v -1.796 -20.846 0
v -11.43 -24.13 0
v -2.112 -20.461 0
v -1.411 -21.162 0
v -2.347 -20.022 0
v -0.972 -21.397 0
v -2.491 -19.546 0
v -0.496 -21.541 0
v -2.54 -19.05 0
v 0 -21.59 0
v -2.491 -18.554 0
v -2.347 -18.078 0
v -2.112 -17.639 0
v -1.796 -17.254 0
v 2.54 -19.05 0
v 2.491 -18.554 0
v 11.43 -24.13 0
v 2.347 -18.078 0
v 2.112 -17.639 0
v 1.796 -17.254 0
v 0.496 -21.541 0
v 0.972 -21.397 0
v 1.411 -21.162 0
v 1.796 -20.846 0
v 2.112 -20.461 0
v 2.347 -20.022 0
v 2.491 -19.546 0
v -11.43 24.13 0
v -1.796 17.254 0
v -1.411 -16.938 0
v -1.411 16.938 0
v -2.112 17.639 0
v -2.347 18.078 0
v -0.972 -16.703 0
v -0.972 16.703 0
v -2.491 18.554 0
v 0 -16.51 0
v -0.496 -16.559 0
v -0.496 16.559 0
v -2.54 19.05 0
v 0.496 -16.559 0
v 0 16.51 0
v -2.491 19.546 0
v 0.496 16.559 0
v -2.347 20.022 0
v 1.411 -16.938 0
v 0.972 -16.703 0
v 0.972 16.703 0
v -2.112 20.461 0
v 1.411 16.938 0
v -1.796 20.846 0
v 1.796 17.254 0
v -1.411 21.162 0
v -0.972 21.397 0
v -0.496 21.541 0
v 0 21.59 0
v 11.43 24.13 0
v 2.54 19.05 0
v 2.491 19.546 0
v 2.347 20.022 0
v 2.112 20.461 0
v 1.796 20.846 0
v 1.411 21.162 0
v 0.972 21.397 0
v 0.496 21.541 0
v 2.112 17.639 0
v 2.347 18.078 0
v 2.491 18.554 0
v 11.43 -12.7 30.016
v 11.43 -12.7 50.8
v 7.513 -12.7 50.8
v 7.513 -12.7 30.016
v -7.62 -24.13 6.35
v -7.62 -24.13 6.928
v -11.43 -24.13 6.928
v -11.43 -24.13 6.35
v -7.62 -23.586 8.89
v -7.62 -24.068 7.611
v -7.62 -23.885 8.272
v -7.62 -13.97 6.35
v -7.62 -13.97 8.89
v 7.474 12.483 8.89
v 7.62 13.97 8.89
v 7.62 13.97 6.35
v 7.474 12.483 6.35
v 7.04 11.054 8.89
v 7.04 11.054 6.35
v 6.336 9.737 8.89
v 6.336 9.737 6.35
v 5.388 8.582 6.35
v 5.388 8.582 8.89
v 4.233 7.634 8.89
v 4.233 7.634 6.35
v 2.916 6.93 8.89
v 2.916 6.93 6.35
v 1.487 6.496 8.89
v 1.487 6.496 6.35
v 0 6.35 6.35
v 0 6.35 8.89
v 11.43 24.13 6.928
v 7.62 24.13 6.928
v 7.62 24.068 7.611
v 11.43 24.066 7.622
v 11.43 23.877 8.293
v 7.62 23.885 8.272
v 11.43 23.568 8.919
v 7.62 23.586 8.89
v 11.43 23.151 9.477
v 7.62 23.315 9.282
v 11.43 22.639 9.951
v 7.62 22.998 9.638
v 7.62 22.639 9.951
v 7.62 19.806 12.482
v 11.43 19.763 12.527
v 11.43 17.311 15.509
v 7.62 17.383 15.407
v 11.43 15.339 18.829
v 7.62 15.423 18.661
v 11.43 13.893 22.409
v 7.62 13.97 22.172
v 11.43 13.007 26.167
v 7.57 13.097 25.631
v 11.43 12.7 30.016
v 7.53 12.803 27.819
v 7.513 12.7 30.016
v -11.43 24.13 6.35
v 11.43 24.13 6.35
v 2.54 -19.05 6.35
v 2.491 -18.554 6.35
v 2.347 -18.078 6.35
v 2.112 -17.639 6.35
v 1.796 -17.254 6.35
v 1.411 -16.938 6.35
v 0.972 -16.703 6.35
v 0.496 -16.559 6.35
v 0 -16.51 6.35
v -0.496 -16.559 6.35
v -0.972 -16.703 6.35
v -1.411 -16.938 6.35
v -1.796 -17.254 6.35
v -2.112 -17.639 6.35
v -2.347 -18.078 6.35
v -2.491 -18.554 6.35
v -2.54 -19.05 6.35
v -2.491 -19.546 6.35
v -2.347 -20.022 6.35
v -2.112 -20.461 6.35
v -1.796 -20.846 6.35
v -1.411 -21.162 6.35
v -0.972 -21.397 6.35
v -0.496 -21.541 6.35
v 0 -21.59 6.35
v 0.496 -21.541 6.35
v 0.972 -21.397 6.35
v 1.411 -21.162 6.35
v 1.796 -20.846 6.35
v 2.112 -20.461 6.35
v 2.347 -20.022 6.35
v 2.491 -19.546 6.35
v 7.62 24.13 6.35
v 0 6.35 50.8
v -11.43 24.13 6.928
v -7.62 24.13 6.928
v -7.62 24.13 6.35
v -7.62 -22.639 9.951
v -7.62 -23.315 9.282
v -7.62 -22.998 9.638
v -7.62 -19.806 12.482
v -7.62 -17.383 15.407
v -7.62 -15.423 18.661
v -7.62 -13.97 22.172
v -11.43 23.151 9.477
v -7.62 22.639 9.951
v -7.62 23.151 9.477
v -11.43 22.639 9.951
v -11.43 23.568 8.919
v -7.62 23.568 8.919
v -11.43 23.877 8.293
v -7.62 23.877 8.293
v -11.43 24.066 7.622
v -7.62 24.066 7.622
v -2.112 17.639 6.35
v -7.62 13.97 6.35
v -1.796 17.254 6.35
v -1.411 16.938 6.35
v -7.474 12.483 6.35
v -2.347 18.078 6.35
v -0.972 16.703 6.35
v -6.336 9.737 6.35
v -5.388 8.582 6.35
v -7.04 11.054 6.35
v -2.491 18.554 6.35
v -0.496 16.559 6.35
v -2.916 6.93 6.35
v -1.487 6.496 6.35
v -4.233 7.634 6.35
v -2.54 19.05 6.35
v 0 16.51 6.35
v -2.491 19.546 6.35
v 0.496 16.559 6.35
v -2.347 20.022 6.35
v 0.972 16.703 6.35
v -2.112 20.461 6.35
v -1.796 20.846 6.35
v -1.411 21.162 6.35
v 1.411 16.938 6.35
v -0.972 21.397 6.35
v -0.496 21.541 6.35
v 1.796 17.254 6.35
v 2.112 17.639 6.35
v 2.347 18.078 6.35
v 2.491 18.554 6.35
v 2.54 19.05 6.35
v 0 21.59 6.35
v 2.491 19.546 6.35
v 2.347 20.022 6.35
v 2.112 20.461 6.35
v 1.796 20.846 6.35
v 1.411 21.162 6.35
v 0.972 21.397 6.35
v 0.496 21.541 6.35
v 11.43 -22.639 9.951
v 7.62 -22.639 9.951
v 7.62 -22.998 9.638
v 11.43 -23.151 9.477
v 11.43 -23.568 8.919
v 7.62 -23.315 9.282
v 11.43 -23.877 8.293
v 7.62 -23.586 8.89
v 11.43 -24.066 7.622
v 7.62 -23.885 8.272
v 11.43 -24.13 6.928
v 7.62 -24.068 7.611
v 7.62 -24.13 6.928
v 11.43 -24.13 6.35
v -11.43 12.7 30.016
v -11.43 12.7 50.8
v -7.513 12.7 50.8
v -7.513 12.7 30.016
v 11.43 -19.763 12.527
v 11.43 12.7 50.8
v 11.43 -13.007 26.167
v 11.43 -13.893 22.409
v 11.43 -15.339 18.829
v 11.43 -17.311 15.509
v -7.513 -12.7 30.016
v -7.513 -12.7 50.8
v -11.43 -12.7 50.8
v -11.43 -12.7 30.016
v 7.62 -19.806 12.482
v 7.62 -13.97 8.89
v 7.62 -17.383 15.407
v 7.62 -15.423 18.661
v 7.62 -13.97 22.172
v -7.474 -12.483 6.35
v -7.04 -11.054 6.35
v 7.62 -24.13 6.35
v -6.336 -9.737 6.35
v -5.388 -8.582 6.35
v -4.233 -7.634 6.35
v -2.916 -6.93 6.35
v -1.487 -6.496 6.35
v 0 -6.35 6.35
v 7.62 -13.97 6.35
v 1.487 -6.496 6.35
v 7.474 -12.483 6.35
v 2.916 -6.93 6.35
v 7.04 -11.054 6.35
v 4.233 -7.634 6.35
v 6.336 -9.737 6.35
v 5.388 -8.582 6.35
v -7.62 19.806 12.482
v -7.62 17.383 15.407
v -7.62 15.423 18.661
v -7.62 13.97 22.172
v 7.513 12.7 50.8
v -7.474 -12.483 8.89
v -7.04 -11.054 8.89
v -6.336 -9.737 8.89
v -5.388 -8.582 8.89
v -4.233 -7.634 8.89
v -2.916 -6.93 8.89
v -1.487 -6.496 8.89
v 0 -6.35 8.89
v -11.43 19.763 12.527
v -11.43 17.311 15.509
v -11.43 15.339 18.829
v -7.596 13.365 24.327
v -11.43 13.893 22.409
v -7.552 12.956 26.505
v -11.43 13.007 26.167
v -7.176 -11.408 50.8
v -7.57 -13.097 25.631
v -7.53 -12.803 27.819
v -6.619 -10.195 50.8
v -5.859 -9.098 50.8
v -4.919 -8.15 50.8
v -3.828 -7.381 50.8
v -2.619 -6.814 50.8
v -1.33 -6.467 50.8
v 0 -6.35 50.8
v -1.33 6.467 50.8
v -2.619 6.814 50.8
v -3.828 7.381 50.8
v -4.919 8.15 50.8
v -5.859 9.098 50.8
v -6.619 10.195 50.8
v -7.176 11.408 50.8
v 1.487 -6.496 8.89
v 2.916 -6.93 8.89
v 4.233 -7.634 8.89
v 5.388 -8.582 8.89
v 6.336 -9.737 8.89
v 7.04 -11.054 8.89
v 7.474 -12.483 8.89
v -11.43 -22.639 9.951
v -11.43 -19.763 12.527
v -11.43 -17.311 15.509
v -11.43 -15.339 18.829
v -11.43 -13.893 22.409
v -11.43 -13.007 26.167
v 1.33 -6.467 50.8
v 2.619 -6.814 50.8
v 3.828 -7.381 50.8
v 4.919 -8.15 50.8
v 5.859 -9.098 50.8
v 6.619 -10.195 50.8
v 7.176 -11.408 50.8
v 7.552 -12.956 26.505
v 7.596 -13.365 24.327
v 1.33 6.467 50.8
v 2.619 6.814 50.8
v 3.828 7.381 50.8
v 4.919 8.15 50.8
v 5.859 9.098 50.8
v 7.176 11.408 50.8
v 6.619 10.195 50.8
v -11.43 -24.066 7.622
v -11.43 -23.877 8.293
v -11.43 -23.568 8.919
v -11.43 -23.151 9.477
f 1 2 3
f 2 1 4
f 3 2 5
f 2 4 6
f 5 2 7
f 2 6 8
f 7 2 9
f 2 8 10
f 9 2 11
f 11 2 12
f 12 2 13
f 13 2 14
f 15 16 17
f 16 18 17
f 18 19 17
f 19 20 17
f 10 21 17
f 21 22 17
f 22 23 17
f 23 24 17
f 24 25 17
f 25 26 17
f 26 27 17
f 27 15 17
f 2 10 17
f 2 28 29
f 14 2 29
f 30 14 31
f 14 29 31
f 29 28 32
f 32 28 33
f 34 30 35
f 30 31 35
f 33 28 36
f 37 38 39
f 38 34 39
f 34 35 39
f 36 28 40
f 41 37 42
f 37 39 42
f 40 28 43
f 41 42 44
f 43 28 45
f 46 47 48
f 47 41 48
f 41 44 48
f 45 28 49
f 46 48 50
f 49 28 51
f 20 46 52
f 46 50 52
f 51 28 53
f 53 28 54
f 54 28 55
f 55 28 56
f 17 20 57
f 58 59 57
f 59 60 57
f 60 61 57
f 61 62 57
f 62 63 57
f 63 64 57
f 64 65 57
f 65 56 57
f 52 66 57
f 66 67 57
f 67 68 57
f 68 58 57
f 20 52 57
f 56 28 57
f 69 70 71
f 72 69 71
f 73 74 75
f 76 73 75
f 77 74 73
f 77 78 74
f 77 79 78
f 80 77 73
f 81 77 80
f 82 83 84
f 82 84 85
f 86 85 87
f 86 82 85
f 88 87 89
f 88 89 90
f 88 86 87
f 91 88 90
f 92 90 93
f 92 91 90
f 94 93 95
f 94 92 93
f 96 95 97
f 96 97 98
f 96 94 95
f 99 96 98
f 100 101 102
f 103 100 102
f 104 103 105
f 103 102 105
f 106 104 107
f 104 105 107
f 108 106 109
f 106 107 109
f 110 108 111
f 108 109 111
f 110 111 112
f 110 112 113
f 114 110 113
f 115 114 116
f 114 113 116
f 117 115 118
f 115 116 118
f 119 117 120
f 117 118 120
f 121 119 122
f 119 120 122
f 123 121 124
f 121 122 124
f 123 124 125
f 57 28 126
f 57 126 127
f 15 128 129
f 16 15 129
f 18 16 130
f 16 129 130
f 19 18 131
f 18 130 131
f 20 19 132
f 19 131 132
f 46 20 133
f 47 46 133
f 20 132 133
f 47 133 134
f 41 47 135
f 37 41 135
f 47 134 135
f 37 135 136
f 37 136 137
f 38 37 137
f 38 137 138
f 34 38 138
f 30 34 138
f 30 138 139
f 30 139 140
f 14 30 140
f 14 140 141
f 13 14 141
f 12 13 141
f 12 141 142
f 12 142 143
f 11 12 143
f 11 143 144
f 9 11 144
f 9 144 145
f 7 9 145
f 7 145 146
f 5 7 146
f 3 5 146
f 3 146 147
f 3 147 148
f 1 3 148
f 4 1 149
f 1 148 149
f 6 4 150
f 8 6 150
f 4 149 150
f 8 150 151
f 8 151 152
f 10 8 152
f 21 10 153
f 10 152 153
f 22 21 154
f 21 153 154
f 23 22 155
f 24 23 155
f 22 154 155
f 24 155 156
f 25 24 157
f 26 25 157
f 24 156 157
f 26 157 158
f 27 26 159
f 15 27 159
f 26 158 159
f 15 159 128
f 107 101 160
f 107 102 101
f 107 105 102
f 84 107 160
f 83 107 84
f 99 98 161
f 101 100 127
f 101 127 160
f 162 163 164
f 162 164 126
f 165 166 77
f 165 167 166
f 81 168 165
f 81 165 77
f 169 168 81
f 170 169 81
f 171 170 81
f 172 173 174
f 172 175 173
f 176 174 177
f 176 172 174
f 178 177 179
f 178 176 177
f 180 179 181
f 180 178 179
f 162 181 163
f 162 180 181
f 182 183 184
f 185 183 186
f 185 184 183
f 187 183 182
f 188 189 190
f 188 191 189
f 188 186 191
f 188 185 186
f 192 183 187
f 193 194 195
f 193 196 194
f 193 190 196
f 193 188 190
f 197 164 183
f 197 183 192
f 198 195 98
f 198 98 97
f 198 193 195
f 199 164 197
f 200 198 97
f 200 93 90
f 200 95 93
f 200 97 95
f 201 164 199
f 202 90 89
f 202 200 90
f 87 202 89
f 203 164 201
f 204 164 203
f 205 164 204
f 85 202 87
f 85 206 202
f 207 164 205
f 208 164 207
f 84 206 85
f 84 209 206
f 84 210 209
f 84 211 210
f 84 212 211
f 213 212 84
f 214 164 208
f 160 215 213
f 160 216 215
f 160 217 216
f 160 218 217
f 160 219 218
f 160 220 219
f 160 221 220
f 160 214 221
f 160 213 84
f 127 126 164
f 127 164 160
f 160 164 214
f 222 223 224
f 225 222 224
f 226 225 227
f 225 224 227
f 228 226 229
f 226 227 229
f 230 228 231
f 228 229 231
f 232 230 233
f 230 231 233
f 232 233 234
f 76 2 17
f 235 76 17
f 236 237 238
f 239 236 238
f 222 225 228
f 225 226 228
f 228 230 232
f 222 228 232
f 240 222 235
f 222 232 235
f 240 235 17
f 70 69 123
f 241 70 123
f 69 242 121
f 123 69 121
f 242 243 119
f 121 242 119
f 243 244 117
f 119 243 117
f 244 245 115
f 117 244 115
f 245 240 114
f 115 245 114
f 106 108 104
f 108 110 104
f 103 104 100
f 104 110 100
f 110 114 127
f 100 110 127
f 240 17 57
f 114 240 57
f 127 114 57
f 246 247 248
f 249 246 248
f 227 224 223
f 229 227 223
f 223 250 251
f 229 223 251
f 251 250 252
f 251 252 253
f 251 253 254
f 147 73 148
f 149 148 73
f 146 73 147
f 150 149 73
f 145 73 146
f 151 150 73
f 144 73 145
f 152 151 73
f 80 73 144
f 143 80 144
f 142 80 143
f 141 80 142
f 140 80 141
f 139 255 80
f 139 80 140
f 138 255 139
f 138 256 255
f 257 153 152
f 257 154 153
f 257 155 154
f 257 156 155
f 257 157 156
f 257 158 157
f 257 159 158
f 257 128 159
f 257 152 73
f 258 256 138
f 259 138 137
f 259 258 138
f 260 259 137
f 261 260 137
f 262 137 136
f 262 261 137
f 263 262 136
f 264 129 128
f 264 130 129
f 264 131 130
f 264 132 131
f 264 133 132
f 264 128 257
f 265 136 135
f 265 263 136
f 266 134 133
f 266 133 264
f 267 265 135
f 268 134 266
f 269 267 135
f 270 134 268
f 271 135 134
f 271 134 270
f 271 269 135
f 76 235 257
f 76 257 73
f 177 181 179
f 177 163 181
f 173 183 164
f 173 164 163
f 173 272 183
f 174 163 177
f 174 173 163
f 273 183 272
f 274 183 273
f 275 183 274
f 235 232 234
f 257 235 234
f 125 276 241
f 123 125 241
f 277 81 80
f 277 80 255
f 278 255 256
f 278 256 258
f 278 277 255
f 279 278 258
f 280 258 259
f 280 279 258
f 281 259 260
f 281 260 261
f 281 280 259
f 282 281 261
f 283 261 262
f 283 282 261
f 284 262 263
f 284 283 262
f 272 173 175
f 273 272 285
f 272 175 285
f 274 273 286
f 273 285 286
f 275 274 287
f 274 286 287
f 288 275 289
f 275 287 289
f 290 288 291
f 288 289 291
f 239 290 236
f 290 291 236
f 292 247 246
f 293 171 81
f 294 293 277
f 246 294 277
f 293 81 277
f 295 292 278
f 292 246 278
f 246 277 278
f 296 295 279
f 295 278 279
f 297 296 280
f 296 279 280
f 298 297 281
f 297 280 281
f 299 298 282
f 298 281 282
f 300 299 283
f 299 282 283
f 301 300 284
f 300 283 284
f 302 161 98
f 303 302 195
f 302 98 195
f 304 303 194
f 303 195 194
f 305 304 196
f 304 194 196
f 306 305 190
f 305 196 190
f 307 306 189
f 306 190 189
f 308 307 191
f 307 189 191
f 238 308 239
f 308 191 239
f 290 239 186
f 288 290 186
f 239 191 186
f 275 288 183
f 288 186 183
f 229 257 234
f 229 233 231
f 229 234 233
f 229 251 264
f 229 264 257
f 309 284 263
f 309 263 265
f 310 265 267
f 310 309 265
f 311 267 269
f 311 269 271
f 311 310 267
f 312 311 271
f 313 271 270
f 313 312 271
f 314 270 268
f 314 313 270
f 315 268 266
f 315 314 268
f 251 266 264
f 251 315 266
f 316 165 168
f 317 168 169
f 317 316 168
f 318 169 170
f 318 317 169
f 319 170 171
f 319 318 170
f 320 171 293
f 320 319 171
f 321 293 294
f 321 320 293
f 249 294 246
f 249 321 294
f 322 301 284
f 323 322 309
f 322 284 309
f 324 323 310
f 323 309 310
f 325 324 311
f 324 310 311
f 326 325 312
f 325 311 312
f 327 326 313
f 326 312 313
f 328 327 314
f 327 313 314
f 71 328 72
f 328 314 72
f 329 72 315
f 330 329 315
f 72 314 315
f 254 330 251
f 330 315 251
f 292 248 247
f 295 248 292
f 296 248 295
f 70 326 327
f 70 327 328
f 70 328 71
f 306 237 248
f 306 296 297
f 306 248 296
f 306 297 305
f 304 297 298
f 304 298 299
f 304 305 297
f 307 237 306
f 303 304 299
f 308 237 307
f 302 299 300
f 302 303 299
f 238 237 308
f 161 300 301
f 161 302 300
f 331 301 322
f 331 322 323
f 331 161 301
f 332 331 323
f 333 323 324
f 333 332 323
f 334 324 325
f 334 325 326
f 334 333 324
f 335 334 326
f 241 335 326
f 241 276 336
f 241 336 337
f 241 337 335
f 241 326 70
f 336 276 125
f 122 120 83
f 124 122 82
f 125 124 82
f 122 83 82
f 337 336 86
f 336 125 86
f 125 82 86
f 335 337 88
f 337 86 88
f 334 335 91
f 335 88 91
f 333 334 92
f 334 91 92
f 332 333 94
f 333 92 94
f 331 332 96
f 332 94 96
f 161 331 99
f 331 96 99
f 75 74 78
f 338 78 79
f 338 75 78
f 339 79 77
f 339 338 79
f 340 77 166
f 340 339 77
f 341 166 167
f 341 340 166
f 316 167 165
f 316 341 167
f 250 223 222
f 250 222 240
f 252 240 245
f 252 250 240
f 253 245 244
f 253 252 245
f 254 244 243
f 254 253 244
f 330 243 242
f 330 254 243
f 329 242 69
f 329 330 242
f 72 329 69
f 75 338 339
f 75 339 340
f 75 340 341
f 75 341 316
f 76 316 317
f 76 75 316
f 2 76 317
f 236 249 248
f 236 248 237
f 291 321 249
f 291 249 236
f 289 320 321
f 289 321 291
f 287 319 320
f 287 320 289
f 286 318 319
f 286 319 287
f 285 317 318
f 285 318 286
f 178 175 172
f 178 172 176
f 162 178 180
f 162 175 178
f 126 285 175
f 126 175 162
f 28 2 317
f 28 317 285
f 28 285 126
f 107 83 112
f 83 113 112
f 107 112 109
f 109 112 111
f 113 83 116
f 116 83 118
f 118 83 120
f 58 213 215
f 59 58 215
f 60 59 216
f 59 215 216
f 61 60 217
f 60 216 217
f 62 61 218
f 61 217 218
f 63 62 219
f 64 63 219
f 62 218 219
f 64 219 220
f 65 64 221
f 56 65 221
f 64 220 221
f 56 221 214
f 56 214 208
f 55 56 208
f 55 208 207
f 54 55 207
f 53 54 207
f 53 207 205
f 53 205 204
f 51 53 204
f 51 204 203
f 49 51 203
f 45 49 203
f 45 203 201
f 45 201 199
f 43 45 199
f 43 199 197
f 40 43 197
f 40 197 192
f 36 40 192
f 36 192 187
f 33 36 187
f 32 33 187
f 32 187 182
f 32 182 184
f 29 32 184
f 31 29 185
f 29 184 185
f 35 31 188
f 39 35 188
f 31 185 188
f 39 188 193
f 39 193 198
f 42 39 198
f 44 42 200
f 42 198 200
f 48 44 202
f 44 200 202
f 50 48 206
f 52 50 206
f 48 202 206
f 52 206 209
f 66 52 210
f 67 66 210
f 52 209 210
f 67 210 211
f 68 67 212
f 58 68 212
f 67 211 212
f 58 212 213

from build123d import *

# Parameters (mm, degrees)
F0_W         = 22.86
F0_H         = 48.26
F1_DEPTH     = 50.8
F2_W         = 15.24
F2_H         = 6.35
F3_DEPTH     = 41.91
F4_T1_DEPTH  = 3.81
F4_T3_DEPTH  = 3.81
F4_T8_DEPTH  = 56.8427535009
F4_T14_DEPTH = 56.8427535009
F4_T20_DEPTH = 56.8427535009
F4_T26_DEPTH = 56.8427535009
F5_R         = 7.61999
F6_DEPTH     = 2.54
F7_R         = 3.81
F8_R         = 2.54
F9_DEPTH     = 25.4


# Not quite as in the source:
# - a fillet or chamfer that OpenCascade refuses, or shapes differently, is made with other operations: its cross-section is extruded or revolved along the edge and cut away or added
# - a fillet or chamfer is up to 0.001 mm smaller than in the source, because OpenCascade refuses the exact size


with BuildPart() as f1:
    # F0 (on Top) → F1 (new body)
    with BuildSketch(Plane.XY):
        Rectangle(F0_W, F0_H)
    extrude(amount=F1_DEPTH)

    # F2 (on face) → F3 (cut)
    with BuildSketch(Plane.XY.offset(50.8)):
        Polygon((11.43, 24.13), (-11.43, 24.13), (-11.43, 12.7), (-7.62, 12.7), (7.62, 12.7), (11.43, 12.7), align=None)
        with Locations((0, 9.525)):
            Rectangle(F2_W, F2_H)
        Polygon((-11.43, -12.7), (-11.43, -24.13), (11.43, -24.13), (11.43, -12.7), (7.62, -12.7), (-7.62, -12.7), align=None)
        with Locations((0, -9.525)):
            Rectangle(F2_W, F2_H)
    extrude(amount=-F3_DEPTH, mode=Mode.SUBTRACT)

    # F4: fillet of radius 25.4 on 4 edges, made by hand

    # F4_s2 → F4_t1 (join)
    with BuildSketch(Plane.YZ.offset(-11.43)):
        with BuildLine():
            ThreePointArc((-24.1299175004, 8.889874725), (-15.7392117545, 18.0547879388), (-12.69985, 30.1031013998))
            Line((-12.69985, 30.1031013998), (-12.19185, 30.1031013998))
            ThreePointArc((-12.19185, 30.1031013998), (-12.192, 19.4965506999), (-12.192, 8.89))
            Line((-12.192, 8.89), (-12.7, 8.382))
            ThreePointArc((-12.7, 8.382), (-18.4149587502, 8.382), (-23.8505188504, 8.4656101915))
            Line((-23.8505188504, 8.4656101915), (-24.1299175004, 8.889874725))
        make_face()
        with BuildLine():
            ThreePointArc((24.1299175004, 8.889874725), (15.7392117545, 18.0547879388), (12.69985, 30.1031013998))
            Line((12.69985, 30.1031013998), (12.19185, 30.1031013998))
            ThreePointArc((12.19185, 30.1031013998), (12.192, 19.4965506999), (12.192, 8.89))
            Line((12.192, 8.89), (12.7, 8.382))
            ThreePointArc((12.7, 8.382), (18.4149587502, 8.382), (23.8505188504, 8.4656101915))
            Line((23.8505188504, 8.4656101915), (24.1299175004, 8.889874725))
        make_face()
    extrude(amount=F4_T1_DEPTH)

    # F4_s4 → F4_t3 (join)
    with BuildSketch(Plane.YZ.offset(7.62)):
        with BuildLine():
            ThreePointArc((-24.1299175004, 8.889874725), (-15.7392117545, 18.0547879388), (-12.69985, 30.1031013998))
            Line((-12.69985, 30.1031013998), (-12.19185, 30.1031013998))
            ThreePointArc((-12.19185, 30.1031013998), (-12.192, 19.4965506999), (-12.192, 8.89))
            Line((-12.192, 8.89), (-12.7, 8.382))
            ThreePointArc((-12.7, 8.382), (-18.4149587502, 8.382), (-23.8505188504, 8.4656101915))
            Line((-23.8505188504, 8.4656101915), (-24.1299175004, 8.889874725))
        make_face()
        with BuildLine():
            ThreePointArc((24.1299175004, 8.889874725), (15.7392117545, 18.0547879388), (12.69985, 30.1031013998))
            Line((12.69985, 30.1031013998), (12.19185, 30.1031013998))
            ThreePointArc((12.19185, 30.1031013998), (12.192, 19.4965506999), (12.192, 8.89))
            Line((12.192, 8.89), (12.7, 8.382))
            ThreePointArc((12.7, 8.382), (18.4149587502, 8.382), (23.8505188504, 8.4656101915))
            Line((23.8505188504, 8.4656101915), (24.1299175004, 8.889874725))
        make_face()
    extrude(amount=F4_T3_DEPTH)


with BuildPart() as f4_tool6:
    # F4_s7 → F4_t8 (new body)
    with BuildSketch(Plane.YZ.offset(45.4127535009)):
        with BuildLine():
            ThreePointArc((-24.1299175004, 8.889874725), (-15.7392117545, 18.0547879388), (-12.69985, 30.1031013998))
            Line((-12.69985, 30.1031013998), (-12.19185, 30.1031013998))
            ThreePointArc((-12.19185, 30.1031013998), (-12.192, 19.4965506999), (-12.192, 8.89))
            Line((-12.192, 8.89), (-12.7, 8.382))
            ThreePointArc((-12.7, 8.382), (-18.4149587502, 8.382), (-23.8505188504, 8.4656101915))
            Line((-23.8505188504, 8.4656101915), (-24.1299175004, 8.889874725))
        make_face()
    extrude(amount=-F4_T8_DEPTH)

    split(bisect_by=Plane.YZ.offset(11.43), keep=Keep.BOTTOM)

    split(bisect_by=Plane.YZ.offset(7.62), keep=Keep.TOP)


with BuildPart() as f1_1:
    add(f1.part)

    # F4_t5: union F4_tool6
    add(f4_tool6.part)


with BuildPart() as f4_tool12:
    # F4_s13 → F4_t14 (new body)
    with BuildSketch(Plane.YZ.offset(11.43)):
        with BuildLine():
            ThreePointArc((-24.1299175004, 8.889874725), (-15.7392117545, 18.0547879388), (-12.69985, 30.1031013998))
            Line((-12.69985, 30.1031013998), (-12.19185, 30.1031013998))
            ThreePointArc((-12.19185, 30.1031013998), (-12.192, 19.4965506999), (-12.192, 8.89))
            Line((-12.192, 8.89), (-12.7, 8.382))
            ThreePointArc((-12.7, 8.382), (-18.4149587502, 8.382), (-23.8505188504, 8.4656101915))
            Line((-23.8505188504, 8.4656101915), (-24.1299175004, 8.889874725))
        make_face()
    extrude(amount=-F4_T14_DEPTH)

    split(bisect_by=Plane.YZ.offset(-11.43), keep=Keep.TOP)

    split(bisect_by=Plane.YZ.offset(-7.62), keep=Keep.BOTTOM)


with BuildPart() as f1_2:
    add(f1_1.part)

    # F4_t11: union F4_tool12
    add(f4_tool12.part)


with BuildPart() as f4_tool18:
    # F4_s19 → F4_t20 (new body)
    with BuildSketch(Plane.YZ.offset(-11.43)):
        with BuildLine():
            ThreePointArc((24.1299175004, 8.889874725), (15.7392117545, 18.0547879388), (12.69985, 30.1031013998))
            Line((12.69985, 30.1031013998), (12.19185, 30.1031013998))
            ThreePointArc((12.19185, 30.1031013998), (12.192, 19.4965506999), (12.192, 8.89))
            Line((12.192, 8.89), (12.7, 8.382))
            ThreePointArc((12.7, 8.382), (18.4149587502, 8.382), (23.8505188504, 8.4656101915))
            Line((23.8505188504, 8.4656101915), (24.1299175004, 8.889874725))
        make_face()
    extrude(amount=F4_T20_DEPTH)

    split(bisect_by=Plane.YZ.offset(11.43), keep=Keep.BOTTOM)

    split(bisect_by=Plane.YZ.offset(7.62), keep=Keep.TOP)


with BuildPart() as f1_3:
    add(f1_2.part)

    # F4_t17: union F4_tool18
    add(f4_tool18.part)


with BuildPart() as f4_tool24:
    # F4_s25 → F4_t26 (new body)
    with BuildSketch(Plane.YZ.offset(-45.4127535009)):
        with BuildLine():
            ThreePointArc((24.1299175004, 8.889874725), (15.7392117545, 18.0547879388), (12.69985, 30.1031013998))
            Line((12.69985, 30.1031013998), (12.19185, 30.1031013998))
            ThreePointArc((12.19185, 30.1031013998), (12.192, 19.4965506999), (12.192, 8.89))
            Line((12.192, 8.89), (12.7, 8.382))
            ThreePointArc((12.7, 8.382), (18.4149587502, 8.382), (23.8505188504, 8.4656101915))
            Line((23.8505188504, 8.4656101915), (24.1299175004, 8.889874725))
        make_face()
    extrude(amount=F4_T26_DEPTH)

    split(bisect_by=Plane.YZ.offset(-11.43), keep=Keep.TOP)

    split(bisect_by=Plane.YZ.offset(-7.62), keep=Keep.BOTTOM)


with BuildPart() as f1_4:
    add(f1_3.part)

    # F4_t23: union F4_tool24
    add(f4_tool24.part)

    # F5 (radius 7.62 in the source; OpenCascade refuses exactly that, so slightly less here)
    f5_edges = [f1_4.edges().sort_by_distance(p)[0] for p in [
        (7.62, 6.35, 29.845),
        (-7.62, 6.35, 29.845),
        (7.62, -6.35, 29.845),
        (-7.62, -6.35, 29.845),
    ]]
    fillet(f5_edges, radius=F5_R)

    # F6 (cut): faces of the model
    f6_faces = [f1_4.faces().sort_by_distance(p)[0] for p in [
        (0, 15.9681179393, 8.89),
        (0, -15.9681179393, 8.89),
    ]]
    extrude(f6_faces, amount=-F6_DEPTH, mode=Mode.SUBTRACT)

    # F7
    f7_edges = [f1_4.edges().sort_by_distance(p)[0] for p in [
        (9.525, 24.129727, 8.89),
        (9.525, -24.129727, 8.89),
        (-9.525, 24.129727, 8.89),
        (-9.525, -24.129727, 8.89),
    ]]
    fillet(f7_edges, radius=F7_R)

    # F8 (on face) → F9 (cut)
    with BuildSketch(Plane.XY.offset(6.35)):
        with Locations((0, -19.05)):
            Circle(F8_R)
        with Locations((0, 19.05)):
            Circle(F8_R)
    extrude(amount=-F9_DEPTH, mode=Mode.SUBTRACT)


solid = f1_4.part
